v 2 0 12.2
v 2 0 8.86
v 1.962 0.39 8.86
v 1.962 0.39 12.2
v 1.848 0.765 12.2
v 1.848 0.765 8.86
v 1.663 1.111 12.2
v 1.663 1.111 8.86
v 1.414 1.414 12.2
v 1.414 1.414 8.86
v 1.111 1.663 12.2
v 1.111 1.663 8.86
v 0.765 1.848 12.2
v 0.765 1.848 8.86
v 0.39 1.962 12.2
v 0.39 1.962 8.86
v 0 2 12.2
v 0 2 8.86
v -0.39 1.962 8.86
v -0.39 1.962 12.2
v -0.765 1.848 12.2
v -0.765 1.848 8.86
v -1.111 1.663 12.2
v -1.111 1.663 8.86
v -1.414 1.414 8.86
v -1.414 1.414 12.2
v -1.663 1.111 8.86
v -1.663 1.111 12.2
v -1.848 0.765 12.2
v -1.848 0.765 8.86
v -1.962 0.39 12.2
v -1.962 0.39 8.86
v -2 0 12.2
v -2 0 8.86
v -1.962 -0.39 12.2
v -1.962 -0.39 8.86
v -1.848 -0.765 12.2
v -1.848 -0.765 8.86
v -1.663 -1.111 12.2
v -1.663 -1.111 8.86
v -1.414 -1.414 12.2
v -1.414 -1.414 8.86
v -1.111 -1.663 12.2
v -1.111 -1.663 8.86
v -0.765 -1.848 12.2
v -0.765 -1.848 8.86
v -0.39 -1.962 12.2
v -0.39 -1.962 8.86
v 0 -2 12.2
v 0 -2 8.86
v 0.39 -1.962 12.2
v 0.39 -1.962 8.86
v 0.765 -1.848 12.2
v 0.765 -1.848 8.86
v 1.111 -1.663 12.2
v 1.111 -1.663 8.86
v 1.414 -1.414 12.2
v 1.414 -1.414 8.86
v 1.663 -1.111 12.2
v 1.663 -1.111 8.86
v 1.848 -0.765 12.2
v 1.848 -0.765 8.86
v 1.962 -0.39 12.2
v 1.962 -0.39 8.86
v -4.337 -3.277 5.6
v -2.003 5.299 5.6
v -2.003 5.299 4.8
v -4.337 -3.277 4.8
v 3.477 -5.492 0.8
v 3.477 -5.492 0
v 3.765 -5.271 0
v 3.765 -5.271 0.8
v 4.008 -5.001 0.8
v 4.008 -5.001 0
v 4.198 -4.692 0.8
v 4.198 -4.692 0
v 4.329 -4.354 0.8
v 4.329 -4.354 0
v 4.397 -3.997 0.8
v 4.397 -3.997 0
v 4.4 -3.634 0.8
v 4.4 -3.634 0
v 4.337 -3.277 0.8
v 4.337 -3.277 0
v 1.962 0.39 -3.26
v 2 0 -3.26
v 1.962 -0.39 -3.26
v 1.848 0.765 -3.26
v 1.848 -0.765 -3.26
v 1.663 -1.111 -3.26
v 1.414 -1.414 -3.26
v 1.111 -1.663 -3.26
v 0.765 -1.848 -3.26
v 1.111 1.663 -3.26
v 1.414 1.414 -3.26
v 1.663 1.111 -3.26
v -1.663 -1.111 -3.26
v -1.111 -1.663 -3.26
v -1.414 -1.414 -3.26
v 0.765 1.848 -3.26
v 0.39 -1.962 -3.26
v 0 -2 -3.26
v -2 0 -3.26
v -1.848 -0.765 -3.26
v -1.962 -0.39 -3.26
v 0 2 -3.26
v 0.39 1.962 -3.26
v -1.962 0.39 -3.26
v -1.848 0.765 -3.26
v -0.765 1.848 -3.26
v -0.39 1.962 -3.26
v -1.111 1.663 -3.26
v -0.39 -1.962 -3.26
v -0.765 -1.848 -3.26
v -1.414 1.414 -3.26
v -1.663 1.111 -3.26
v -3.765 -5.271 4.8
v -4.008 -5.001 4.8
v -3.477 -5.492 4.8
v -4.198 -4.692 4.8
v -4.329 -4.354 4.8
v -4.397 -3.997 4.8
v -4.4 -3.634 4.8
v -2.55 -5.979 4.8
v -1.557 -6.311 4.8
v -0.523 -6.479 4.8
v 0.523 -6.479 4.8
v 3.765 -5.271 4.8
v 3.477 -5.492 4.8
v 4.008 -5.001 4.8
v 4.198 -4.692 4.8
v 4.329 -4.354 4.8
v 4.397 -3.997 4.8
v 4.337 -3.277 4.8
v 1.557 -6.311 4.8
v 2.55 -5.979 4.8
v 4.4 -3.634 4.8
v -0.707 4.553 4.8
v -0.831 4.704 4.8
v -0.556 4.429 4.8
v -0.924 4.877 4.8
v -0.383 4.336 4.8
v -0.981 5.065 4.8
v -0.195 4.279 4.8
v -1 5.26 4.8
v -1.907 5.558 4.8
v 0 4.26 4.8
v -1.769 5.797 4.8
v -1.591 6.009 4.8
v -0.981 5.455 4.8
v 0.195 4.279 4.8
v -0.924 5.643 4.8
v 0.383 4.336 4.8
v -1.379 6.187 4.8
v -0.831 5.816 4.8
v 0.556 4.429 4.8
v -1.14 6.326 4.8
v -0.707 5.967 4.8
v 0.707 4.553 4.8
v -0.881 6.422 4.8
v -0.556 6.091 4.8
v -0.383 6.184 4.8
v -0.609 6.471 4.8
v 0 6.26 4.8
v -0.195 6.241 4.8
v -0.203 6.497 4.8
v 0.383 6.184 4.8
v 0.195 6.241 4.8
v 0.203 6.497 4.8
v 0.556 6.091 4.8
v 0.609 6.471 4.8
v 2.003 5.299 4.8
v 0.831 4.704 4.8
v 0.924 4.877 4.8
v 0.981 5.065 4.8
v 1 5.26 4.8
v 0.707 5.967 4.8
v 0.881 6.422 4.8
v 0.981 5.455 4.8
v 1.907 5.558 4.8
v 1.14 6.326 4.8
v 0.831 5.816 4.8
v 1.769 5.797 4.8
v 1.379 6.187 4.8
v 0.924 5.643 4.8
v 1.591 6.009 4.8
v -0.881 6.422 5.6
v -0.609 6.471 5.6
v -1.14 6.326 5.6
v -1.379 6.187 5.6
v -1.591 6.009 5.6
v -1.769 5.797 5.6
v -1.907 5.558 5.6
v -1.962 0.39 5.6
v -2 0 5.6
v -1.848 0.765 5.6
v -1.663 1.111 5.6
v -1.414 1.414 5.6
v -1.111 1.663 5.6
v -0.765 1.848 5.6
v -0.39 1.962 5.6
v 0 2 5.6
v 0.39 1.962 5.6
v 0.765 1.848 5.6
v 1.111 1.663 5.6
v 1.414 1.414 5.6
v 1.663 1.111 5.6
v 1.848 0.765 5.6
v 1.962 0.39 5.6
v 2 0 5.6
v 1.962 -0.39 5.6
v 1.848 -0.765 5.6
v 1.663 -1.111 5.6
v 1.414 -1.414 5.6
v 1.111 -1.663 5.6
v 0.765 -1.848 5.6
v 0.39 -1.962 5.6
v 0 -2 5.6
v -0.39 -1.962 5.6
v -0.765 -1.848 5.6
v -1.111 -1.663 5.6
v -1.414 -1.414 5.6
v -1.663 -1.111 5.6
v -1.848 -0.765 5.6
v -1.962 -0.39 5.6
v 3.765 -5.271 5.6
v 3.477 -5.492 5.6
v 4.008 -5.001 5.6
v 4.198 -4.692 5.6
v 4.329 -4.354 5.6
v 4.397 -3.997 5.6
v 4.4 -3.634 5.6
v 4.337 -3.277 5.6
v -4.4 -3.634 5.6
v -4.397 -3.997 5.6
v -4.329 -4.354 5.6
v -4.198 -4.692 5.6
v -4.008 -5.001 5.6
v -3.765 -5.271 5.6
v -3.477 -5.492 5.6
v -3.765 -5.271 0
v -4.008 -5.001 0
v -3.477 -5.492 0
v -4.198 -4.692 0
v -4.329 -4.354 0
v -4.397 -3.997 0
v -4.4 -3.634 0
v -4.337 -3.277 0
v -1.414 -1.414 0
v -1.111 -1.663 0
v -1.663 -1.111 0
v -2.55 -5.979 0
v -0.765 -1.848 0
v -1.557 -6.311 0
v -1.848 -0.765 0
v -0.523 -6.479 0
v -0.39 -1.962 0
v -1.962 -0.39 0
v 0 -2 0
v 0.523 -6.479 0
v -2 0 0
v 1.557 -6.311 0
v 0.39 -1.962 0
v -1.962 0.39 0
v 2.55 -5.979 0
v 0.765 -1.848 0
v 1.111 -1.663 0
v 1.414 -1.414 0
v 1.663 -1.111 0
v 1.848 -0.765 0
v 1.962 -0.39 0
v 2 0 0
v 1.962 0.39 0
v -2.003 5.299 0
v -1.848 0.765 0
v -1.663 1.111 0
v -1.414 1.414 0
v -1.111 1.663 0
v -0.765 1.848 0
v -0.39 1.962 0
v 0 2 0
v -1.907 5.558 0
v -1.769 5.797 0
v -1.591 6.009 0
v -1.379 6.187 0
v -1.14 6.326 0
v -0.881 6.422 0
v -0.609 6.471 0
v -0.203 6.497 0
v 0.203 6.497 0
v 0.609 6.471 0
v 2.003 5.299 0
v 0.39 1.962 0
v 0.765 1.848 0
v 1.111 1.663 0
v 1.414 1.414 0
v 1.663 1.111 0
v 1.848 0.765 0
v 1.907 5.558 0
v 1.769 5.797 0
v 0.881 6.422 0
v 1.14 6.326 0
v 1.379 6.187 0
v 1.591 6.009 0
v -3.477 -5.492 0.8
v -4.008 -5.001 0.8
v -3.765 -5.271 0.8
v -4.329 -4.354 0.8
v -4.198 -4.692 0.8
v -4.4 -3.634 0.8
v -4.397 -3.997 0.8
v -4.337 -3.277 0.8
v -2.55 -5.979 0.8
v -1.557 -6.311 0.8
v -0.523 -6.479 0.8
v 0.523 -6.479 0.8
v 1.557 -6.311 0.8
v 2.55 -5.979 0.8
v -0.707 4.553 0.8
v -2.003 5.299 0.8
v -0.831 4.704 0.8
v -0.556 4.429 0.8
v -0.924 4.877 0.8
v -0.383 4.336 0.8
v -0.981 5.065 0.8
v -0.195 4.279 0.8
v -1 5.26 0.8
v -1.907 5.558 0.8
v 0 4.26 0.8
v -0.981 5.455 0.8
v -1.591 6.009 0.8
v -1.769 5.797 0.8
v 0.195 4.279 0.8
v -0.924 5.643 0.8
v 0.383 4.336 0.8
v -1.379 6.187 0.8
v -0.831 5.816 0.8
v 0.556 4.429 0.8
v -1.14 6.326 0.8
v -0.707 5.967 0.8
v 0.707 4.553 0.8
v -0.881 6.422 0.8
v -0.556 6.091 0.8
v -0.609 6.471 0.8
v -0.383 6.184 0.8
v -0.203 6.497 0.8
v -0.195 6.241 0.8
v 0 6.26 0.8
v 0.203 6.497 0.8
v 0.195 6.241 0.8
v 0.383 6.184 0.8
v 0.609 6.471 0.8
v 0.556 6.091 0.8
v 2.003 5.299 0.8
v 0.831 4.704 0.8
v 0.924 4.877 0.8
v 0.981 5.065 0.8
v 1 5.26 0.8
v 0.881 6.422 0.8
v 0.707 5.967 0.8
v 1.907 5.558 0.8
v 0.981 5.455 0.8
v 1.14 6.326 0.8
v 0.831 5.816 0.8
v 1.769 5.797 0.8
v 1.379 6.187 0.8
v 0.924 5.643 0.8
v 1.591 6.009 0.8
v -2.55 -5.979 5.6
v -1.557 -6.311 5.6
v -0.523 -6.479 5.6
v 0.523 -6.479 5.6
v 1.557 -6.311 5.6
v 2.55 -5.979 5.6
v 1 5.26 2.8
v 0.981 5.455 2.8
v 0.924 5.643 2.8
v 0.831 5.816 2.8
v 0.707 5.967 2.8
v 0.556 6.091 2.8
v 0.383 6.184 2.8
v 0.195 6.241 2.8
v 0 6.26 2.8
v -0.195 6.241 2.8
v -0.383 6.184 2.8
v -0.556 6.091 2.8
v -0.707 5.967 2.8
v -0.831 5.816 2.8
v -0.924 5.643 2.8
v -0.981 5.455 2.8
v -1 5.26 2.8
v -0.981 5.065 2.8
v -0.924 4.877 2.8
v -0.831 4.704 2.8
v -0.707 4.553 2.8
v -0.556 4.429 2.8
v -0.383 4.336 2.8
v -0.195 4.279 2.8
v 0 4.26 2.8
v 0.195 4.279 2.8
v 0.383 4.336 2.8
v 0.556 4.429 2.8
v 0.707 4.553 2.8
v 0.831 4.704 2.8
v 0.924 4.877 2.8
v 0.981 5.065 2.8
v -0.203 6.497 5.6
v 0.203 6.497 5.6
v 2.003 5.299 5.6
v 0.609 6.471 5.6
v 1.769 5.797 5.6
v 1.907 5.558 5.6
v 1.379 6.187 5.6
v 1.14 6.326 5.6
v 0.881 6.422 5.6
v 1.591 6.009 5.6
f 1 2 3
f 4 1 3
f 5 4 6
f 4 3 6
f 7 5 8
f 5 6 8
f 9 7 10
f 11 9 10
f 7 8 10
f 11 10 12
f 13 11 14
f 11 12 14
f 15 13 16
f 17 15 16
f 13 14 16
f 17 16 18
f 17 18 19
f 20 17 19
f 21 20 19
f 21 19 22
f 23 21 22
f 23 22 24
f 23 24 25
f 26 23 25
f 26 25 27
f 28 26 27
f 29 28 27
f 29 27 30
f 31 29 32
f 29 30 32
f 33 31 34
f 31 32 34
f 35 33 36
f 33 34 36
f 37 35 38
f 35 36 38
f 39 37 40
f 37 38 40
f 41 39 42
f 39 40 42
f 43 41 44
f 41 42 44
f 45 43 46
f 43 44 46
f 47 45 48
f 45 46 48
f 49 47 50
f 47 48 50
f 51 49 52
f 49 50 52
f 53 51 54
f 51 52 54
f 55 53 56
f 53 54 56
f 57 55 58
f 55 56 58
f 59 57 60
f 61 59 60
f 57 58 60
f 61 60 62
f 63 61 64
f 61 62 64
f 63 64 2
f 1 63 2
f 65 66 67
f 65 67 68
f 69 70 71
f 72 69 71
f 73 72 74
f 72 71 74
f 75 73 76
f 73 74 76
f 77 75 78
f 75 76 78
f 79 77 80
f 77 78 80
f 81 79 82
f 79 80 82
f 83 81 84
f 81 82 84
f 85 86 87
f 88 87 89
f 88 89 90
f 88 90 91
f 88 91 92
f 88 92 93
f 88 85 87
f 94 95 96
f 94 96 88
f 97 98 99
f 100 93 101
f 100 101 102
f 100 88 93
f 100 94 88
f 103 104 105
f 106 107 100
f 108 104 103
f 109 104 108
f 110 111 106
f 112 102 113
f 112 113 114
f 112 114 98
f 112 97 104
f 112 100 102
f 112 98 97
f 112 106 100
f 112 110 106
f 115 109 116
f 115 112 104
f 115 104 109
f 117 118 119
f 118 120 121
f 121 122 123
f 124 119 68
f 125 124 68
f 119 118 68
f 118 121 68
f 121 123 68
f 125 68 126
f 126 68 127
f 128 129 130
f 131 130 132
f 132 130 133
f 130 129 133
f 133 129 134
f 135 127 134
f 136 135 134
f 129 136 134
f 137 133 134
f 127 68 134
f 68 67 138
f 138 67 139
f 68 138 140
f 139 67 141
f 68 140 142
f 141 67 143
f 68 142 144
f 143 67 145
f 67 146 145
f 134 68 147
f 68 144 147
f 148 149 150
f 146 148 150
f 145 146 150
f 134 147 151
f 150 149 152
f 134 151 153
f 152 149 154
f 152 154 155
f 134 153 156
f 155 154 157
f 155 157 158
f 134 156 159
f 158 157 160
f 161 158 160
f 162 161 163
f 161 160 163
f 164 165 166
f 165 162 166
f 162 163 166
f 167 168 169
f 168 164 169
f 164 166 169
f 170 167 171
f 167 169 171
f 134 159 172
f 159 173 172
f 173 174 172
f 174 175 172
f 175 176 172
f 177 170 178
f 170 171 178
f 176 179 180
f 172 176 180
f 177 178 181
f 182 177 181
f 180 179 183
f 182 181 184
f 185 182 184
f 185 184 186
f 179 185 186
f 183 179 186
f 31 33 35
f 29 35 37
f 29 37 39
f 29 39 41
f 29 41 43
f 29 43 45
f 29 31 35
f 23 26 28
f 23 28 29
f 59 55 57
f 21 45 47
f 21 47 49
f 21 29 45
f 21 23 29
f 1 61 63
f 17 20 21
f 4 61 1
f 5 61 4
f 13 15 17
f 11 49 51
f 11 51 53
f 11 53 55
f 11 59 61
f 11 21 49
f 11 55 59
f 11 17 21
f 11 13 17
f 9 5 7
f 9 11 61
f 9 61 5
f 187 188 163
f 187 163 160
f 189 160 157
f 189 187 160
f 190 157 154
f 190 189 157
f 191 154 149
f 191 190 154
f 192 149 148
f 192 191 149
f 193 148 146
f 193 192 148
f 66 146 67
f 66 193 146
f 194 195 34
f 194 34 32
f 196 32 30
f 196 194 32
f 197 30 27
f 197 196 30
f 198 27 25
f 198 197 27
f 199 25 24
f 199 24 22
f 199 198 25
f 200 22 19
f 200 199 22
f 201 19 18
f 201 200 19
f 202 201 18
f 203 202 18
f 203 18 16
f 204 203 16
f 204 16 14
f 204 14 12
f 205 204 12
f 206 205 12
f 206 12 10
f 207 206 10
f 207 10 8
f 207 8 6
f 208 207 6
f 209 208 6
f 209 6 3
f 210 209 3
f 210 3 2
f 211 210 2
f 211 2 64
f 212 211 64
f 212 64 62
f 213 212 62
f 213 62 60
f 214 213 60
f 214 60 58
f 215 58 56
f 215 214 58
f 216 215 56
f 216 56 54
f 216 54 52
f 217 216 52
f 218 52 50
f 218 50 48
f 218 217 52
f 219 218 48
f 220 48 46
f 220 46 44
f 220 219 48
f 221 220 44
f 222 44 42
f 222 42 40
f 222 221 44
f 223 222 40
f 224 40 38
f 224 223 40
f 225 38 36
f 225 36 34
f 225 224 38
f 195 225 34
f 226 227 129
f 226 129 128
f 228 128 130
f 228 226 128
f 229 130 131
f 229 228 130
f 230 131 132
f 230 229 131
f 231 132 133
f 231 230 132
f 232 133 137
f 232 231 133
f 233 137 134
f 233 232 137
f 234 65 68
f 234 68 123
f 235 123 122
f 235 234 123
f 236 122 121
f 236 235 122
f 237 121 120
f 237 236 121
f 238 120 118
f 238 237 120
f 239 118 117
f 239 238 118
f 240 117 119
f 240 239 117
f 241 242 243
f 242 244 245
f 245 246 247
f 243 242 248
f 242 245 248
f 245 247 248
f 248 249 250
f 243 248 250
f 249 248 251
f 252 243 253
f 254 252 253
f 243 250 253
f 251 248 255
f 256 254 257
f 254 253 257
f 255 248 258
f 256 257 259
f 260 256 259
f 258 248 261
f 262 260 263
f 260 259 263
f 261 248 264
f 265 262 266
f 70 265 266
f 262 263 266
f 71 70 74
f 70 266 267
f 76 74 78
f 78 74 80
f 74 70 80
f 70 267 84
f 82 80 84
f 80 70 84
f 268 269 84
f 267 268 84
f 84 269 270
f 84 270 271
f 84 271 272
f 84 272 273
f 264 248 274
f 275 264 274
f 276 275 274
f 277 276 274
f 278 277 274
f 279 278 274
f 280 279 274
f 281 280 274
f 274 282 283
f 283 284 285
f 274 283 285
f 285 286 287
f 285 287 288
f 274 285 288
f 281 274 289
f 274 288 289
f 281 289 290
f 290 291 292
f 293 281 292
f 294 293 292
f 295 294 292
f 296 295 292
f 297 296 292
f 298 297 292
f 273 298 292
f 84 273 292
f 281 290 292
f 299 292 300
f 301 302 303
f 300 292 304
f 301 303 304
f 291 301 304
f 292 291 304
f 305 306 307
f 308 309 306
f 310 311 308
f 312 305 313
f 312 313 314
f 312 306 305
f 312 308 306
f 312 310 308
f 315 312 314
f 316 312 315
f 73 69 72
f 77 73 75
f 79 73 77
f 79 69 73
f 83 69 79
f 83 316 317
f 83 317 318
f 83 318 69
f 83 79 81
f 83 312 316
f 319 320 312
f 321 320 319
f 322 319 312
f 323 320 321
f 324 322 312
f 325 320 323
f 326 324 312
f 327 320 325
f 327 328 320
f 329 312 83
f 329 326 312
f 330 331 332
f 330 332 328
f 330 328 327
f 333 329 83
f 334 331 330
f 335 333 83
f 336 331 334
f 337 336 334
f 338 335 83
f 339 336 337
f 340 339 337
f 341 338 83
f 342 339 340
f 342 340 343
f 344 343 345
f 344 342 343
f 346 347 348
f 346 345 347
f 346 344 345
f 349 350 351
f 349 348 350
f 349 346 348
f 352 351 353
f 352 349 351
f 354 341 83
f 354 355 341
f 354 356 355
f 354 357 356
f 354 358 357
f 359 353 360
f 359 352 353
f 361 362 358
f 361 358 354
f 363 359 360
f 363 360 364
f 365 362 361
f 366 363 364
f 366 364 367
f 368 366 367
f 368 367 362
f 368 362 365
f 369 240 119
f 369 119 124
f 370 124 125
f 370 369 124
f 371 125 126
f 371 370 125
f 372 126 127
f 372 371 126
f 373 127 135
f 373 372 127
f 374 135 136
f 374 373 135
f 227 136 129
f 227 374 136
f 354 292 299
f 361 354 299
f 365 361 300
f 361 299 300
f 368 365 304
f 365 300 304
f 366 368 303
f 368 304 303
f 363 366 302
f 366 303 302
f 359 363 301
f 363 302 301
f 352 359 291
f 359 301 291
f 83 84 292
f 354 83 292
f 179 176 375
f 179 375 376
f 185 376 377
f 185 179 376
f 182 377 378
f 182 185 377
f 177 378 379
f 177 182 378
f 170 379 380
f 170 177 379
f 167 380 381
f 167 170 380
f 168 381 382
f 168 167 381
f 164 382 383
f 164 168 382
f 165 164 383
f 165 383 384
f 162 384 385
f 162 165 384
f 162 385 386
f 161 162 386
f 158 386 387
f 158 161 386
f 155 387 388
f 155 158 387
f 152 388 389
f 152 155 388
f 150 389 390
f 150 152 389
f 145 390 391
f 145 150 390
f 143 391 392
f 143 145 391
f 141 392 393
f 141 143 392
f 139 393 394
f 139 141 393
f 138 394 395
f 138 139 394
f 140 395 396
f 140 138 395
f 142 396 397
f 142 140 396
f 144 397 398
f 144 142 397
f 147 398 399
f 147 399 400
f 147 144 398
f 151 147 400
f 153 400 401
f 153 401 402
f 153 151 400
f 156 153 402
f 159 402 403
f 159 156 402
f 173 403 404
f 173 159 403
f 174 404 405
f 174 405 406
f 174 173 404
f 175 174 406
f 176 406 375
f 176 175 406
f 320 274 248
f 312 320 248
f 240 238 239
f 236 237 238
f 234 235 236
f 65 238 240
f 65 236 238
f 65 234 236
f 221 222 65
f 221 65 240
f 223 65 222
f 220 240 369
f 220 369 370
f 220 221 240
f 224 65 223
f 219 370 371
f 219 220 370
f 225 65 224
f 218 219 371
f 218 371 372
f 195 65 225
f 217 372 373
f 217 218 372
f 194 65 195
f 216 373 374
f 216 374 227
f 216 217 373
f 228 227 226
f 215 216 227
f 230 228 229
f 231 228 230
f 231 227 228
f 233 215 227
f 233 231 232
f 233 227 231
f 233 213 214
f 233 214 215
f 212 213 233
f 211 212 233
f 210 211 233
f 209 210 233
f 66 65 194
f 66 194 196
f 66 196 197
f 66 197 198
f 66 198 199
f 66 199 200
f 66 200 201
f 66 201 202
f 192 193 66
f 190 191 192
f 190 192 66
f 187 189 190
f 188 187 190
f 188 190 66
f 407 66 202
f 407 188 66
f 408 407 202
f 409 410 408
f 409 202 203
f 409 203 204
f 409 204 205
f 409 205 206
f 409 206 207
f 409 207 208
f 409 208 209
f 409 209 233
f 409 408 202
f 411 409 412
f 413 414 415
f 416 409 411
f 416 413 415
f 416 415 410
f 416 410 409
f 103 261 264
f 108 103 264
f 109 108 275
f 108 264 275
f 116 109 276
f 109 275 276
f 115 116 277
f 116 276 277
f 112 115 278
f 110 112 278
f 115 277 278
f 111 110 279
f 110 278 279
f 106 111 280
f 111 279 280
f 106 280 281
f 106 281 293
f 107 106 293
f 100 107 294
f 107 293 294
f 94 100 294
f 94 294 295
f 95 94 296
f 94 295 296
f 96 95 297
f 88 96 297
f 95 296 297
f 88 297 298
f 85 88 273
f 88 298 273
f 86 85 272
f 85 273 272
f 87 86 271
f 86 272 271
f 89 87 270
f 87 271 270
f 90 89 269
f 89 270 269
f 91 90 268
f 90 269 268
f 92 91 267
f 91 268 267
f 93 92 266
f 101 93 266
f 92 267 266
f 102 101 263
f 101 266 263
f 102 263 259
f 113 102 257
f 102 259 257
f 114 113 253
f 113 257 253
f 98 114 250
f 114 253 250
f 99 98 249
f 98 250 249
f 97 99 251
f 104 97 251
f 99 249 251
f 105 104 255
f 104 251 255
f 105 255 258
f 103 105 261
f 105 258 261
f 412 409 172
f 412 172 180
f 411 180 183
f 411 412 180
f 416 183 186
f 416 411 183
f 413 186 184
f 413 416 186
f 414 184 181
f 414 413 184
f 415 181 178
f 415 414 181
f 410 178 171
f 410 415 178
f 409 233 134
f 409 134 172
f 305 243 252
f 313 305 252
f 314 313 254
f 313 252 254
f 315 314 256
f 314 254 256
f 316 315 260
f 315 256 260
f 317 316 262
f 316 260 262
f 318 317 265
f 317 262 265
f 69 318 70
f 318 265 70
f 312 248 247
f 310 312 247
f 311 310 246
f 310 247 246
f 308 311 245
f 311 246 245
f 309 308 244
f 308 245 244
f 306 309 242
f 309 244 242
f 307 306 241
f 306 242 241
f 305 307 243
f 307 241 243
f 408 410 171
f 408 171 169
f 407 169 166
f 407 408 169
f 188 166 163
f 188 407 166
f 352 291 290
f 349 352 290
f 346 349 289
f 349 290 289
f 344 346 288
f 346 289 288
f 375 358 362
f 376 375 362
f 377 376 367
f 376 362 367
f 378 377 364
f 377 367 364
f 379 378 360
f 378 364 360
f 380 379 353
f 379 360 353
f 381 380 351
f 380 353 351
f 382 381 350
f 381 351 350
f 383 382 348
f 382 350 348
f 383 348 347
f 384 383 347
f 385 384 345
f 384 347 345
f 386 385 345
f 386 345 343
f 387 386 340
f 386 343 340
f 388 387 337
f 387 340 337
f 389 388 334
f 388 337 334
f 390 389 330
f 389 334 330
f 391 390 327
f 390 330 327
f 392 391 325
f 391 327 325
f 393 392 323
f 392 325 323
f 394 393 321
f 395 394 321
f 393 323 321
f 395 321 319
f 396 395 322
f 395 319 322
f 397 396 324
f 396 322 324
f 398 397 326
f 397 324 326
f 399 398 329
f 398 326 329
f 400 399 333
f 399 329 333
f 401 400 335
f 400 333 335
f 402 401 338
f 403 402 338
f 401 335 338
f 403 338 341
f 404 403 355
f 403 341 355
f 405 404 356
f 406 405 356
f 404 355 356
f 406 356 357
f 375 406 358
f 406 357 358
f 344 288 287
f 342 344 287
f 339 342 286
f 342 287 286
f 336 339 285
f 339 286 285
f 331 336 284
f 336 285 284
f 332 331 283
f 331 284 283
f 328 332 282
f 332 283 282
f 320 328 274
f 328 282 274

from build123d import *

# Parameters (mm, degrees)
BOSS_EXTRUDE1_DEPTH = 0.8
SKETCH2_R           = 1
BOSS_EXTRUDE2_DEPTH = 2
SKETCH3_R           = 2
BOSS_EXTRUDE3_DEPTH = 3.26
SKETCH6_R           = 2
BOSS_EXTRUDE4_DEPTH = 3.34


with BuildPart() as part:
    # Sketch1 → Boss-Extrude1 (new body)
    with BuildSketch(Plane.XY):
        with BuildLine():
            Line((-2.002843202, 5.298630925), (-4.336792166, -3.276937888))
            ThreePointArc((-4.336792166, -3.276937888), (-4.27139076, -4.52603882), (-3.476760681, -5.492006479))
            ThreePointArc((-3.476760681, -5.492006479), (0, -6.5), (3.476760681, -5.492006479))
            ThreePointArc((3.476760681, -5.492006479), (4.27139076, -4.52603882), (4.336792166, -3.276937888))
            Line((4.336792166, -3.276937888), (2.002843202, 5.298630925))
            ThreePointArc((2.002843202, 5.298630925), (1.489063424, 6.102778606), (0.608877551, 6.471419329))
            ThreePointArc((0.608877551, 6.471419329), (0, 6.5), (-0.608877551, 6.471419329))
            ThreePointArc((-0.608877551, 6.471419329), (-1.489063424, 6.102778606), (-2.002843202, 5.298630925))
        make_face()
    extrude(amount=BOSS_EXTRUDE1_DEPTH)

    # Sketch2 → Boss-Extrude2 (add)
    with BuildSketch(Plane.XY.offset(0.8)):
        with Locations((0, 5.26)):
            Circle(SKETCH2_R)
    extrude(amount=BOSS_EXTRUDE2_DEPTH)

    # Sketch3 → Boss-Extrude3 (add)
    with BuildSketch(Plane(origin=(0, 0, 0), x_dir=(-1, 0, 0), z_dir=(0, 0, -1))):
        Circle(SKETCH3_R)
    extrude(amount=BOSS_EXTRUDE3_DEPTH)

    # Mirror1: part across plane


with BuildPart() as part_1:
    add(part.part)
    add(part.part.mirror(Plane(origin=(0, 5.26, 2.8), x_dir=(1, 0, 0), z_dir=(0, 0, 1))))

    # Sketch6 → Boss-Extrude4 (add)
    with BuildSketch(Plane.XY.offset(8.86)):
        Circle(SKETCH6_R)
    extrude(amount=BOSS_EXTRUDE4_DEPTH)


solid = part_1.part
